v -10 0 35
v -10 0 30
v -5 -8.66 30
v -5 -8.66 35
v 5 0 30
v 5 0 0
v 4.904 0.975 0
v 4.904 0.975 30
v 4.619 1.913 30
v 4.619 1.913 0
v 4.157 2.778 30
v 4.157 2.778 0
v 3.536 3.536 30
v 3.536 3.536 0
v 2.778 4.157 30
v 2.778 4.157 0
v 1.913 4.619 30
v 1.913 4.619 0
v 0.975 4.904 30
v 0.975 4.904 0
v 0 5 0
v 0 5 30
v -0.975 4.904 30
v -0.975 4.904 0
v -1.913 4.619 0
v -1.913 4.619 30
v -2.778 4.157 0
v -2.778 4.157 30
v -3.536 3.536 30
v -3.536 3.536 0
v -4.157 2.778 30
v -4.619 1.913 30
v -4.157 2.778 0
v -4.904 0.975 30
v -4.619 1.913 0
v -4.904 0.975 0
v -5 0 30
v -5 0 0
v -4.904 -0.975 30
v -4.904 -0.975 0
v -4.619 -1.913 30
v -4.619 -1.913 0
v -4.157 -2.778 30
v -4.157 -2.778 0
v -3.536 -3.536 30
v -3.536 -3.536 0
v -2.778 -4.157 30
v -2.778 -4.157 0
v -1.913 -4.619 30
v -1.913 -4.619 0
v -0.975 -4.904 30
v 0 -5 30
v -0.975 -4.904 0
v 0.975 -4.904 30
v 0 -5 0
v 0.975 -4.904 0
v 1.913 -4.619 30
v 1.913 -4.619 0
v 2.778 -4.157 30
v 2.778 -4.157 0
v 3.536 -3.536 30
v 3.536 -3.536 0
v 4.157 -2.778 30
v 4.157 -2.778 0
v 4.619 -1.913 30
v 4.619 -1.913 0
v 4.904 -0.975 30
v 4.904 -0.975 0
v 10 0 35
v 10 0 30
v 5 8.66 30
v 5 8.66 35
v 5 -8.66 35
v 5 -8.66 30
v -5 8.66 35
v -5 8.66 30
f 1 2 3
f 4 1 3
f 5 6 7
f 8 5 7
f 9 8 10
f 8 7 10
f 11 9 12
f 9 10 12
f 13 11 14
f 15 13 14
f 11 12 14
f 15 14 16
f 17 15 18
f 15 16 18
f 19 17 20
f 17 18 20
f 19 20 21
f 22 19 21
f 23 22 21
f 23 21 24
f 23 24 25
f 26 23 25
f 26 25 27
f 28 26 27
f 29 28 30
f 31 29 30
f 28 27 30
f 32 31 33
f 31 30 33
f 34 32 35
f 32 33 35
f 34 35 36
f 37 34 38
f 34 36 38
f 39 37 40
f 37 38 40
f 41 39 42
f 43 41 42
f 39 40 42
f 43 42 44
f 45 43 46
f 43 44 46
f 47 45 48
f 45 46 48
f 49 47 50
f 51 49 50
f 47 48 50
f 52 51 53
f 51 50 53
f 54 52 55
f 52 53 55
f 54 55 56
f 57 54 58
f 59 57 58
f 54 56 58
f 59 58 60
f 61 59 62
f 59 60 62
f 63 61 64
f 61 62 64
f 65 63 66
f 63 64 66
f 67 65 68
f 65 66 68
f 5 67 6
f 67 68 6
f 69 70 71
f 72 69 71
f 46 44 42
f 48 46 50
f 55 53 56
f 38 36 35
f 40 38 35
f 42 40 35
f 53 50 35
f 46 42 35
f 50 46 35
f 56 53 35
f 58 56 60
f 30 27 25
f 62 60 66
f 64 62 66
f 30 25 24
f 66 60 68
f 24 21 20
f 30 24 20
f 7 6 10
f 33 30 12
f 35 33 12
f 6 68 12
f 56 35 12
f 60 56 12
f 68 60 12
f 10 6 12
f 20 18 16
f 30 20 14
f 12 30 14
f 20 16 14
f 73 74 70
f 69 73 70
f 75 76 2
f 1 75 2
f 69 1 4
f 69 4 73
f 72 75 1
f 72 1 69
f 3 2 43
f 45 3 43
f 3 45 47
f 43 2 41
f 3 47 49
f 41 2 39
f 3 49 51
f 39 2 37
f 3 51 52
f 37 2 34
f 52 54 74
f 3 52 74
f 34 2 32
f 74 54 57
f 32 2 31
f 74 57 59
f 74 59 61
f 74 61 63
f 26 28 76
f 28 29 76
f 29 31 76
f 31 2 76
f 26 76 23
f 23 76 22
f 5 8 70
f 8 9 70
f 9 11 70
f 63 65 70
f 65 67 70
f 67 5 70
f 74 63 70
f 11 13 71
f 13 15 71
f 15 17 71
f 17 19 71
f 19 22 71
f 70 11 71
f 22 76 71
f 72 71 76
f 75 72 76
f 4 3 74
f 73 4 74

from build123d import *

# Parameters (mm, degrees)
SKETCH1_R           = 5
BOSS_EXTRUDE1_DEPTH = 30
SKETCH6_R           = 5
BOSS_EXTRUDE3_DEPTH = 5


with BuildPart() as part:
    # Sketch1 → Boss-Extrude1 (new body)
    with BuildSketch(Plane.XY):
        Circle(SKETCH1_R)
    extrude(amount=BOSS_EXTRUDE1_DEPTH)

    # Sketch6 → Boss-Extrude3 (add)
    # profile 1 of 2: a face of its own
    with BuildSketch(Plane.XY.offset(30)):
        Polygon((5, 8.660254038), (-5, 8.660254038), (-10, 0), (-5, -8.660254038), (5, -8.660254038), (10, 0), align=None)
        Circle(SKETCH6_R, mode=Mode.SUBTRACT)
    # profile 2 of 2: a face of its own
    with BuildSketch(Plane.XY.offset(30)):
        Circle(SKETCH6_R)
    extrude(amount=BOSS_EXTRUDE3_DEPTH)


solid = part.part
